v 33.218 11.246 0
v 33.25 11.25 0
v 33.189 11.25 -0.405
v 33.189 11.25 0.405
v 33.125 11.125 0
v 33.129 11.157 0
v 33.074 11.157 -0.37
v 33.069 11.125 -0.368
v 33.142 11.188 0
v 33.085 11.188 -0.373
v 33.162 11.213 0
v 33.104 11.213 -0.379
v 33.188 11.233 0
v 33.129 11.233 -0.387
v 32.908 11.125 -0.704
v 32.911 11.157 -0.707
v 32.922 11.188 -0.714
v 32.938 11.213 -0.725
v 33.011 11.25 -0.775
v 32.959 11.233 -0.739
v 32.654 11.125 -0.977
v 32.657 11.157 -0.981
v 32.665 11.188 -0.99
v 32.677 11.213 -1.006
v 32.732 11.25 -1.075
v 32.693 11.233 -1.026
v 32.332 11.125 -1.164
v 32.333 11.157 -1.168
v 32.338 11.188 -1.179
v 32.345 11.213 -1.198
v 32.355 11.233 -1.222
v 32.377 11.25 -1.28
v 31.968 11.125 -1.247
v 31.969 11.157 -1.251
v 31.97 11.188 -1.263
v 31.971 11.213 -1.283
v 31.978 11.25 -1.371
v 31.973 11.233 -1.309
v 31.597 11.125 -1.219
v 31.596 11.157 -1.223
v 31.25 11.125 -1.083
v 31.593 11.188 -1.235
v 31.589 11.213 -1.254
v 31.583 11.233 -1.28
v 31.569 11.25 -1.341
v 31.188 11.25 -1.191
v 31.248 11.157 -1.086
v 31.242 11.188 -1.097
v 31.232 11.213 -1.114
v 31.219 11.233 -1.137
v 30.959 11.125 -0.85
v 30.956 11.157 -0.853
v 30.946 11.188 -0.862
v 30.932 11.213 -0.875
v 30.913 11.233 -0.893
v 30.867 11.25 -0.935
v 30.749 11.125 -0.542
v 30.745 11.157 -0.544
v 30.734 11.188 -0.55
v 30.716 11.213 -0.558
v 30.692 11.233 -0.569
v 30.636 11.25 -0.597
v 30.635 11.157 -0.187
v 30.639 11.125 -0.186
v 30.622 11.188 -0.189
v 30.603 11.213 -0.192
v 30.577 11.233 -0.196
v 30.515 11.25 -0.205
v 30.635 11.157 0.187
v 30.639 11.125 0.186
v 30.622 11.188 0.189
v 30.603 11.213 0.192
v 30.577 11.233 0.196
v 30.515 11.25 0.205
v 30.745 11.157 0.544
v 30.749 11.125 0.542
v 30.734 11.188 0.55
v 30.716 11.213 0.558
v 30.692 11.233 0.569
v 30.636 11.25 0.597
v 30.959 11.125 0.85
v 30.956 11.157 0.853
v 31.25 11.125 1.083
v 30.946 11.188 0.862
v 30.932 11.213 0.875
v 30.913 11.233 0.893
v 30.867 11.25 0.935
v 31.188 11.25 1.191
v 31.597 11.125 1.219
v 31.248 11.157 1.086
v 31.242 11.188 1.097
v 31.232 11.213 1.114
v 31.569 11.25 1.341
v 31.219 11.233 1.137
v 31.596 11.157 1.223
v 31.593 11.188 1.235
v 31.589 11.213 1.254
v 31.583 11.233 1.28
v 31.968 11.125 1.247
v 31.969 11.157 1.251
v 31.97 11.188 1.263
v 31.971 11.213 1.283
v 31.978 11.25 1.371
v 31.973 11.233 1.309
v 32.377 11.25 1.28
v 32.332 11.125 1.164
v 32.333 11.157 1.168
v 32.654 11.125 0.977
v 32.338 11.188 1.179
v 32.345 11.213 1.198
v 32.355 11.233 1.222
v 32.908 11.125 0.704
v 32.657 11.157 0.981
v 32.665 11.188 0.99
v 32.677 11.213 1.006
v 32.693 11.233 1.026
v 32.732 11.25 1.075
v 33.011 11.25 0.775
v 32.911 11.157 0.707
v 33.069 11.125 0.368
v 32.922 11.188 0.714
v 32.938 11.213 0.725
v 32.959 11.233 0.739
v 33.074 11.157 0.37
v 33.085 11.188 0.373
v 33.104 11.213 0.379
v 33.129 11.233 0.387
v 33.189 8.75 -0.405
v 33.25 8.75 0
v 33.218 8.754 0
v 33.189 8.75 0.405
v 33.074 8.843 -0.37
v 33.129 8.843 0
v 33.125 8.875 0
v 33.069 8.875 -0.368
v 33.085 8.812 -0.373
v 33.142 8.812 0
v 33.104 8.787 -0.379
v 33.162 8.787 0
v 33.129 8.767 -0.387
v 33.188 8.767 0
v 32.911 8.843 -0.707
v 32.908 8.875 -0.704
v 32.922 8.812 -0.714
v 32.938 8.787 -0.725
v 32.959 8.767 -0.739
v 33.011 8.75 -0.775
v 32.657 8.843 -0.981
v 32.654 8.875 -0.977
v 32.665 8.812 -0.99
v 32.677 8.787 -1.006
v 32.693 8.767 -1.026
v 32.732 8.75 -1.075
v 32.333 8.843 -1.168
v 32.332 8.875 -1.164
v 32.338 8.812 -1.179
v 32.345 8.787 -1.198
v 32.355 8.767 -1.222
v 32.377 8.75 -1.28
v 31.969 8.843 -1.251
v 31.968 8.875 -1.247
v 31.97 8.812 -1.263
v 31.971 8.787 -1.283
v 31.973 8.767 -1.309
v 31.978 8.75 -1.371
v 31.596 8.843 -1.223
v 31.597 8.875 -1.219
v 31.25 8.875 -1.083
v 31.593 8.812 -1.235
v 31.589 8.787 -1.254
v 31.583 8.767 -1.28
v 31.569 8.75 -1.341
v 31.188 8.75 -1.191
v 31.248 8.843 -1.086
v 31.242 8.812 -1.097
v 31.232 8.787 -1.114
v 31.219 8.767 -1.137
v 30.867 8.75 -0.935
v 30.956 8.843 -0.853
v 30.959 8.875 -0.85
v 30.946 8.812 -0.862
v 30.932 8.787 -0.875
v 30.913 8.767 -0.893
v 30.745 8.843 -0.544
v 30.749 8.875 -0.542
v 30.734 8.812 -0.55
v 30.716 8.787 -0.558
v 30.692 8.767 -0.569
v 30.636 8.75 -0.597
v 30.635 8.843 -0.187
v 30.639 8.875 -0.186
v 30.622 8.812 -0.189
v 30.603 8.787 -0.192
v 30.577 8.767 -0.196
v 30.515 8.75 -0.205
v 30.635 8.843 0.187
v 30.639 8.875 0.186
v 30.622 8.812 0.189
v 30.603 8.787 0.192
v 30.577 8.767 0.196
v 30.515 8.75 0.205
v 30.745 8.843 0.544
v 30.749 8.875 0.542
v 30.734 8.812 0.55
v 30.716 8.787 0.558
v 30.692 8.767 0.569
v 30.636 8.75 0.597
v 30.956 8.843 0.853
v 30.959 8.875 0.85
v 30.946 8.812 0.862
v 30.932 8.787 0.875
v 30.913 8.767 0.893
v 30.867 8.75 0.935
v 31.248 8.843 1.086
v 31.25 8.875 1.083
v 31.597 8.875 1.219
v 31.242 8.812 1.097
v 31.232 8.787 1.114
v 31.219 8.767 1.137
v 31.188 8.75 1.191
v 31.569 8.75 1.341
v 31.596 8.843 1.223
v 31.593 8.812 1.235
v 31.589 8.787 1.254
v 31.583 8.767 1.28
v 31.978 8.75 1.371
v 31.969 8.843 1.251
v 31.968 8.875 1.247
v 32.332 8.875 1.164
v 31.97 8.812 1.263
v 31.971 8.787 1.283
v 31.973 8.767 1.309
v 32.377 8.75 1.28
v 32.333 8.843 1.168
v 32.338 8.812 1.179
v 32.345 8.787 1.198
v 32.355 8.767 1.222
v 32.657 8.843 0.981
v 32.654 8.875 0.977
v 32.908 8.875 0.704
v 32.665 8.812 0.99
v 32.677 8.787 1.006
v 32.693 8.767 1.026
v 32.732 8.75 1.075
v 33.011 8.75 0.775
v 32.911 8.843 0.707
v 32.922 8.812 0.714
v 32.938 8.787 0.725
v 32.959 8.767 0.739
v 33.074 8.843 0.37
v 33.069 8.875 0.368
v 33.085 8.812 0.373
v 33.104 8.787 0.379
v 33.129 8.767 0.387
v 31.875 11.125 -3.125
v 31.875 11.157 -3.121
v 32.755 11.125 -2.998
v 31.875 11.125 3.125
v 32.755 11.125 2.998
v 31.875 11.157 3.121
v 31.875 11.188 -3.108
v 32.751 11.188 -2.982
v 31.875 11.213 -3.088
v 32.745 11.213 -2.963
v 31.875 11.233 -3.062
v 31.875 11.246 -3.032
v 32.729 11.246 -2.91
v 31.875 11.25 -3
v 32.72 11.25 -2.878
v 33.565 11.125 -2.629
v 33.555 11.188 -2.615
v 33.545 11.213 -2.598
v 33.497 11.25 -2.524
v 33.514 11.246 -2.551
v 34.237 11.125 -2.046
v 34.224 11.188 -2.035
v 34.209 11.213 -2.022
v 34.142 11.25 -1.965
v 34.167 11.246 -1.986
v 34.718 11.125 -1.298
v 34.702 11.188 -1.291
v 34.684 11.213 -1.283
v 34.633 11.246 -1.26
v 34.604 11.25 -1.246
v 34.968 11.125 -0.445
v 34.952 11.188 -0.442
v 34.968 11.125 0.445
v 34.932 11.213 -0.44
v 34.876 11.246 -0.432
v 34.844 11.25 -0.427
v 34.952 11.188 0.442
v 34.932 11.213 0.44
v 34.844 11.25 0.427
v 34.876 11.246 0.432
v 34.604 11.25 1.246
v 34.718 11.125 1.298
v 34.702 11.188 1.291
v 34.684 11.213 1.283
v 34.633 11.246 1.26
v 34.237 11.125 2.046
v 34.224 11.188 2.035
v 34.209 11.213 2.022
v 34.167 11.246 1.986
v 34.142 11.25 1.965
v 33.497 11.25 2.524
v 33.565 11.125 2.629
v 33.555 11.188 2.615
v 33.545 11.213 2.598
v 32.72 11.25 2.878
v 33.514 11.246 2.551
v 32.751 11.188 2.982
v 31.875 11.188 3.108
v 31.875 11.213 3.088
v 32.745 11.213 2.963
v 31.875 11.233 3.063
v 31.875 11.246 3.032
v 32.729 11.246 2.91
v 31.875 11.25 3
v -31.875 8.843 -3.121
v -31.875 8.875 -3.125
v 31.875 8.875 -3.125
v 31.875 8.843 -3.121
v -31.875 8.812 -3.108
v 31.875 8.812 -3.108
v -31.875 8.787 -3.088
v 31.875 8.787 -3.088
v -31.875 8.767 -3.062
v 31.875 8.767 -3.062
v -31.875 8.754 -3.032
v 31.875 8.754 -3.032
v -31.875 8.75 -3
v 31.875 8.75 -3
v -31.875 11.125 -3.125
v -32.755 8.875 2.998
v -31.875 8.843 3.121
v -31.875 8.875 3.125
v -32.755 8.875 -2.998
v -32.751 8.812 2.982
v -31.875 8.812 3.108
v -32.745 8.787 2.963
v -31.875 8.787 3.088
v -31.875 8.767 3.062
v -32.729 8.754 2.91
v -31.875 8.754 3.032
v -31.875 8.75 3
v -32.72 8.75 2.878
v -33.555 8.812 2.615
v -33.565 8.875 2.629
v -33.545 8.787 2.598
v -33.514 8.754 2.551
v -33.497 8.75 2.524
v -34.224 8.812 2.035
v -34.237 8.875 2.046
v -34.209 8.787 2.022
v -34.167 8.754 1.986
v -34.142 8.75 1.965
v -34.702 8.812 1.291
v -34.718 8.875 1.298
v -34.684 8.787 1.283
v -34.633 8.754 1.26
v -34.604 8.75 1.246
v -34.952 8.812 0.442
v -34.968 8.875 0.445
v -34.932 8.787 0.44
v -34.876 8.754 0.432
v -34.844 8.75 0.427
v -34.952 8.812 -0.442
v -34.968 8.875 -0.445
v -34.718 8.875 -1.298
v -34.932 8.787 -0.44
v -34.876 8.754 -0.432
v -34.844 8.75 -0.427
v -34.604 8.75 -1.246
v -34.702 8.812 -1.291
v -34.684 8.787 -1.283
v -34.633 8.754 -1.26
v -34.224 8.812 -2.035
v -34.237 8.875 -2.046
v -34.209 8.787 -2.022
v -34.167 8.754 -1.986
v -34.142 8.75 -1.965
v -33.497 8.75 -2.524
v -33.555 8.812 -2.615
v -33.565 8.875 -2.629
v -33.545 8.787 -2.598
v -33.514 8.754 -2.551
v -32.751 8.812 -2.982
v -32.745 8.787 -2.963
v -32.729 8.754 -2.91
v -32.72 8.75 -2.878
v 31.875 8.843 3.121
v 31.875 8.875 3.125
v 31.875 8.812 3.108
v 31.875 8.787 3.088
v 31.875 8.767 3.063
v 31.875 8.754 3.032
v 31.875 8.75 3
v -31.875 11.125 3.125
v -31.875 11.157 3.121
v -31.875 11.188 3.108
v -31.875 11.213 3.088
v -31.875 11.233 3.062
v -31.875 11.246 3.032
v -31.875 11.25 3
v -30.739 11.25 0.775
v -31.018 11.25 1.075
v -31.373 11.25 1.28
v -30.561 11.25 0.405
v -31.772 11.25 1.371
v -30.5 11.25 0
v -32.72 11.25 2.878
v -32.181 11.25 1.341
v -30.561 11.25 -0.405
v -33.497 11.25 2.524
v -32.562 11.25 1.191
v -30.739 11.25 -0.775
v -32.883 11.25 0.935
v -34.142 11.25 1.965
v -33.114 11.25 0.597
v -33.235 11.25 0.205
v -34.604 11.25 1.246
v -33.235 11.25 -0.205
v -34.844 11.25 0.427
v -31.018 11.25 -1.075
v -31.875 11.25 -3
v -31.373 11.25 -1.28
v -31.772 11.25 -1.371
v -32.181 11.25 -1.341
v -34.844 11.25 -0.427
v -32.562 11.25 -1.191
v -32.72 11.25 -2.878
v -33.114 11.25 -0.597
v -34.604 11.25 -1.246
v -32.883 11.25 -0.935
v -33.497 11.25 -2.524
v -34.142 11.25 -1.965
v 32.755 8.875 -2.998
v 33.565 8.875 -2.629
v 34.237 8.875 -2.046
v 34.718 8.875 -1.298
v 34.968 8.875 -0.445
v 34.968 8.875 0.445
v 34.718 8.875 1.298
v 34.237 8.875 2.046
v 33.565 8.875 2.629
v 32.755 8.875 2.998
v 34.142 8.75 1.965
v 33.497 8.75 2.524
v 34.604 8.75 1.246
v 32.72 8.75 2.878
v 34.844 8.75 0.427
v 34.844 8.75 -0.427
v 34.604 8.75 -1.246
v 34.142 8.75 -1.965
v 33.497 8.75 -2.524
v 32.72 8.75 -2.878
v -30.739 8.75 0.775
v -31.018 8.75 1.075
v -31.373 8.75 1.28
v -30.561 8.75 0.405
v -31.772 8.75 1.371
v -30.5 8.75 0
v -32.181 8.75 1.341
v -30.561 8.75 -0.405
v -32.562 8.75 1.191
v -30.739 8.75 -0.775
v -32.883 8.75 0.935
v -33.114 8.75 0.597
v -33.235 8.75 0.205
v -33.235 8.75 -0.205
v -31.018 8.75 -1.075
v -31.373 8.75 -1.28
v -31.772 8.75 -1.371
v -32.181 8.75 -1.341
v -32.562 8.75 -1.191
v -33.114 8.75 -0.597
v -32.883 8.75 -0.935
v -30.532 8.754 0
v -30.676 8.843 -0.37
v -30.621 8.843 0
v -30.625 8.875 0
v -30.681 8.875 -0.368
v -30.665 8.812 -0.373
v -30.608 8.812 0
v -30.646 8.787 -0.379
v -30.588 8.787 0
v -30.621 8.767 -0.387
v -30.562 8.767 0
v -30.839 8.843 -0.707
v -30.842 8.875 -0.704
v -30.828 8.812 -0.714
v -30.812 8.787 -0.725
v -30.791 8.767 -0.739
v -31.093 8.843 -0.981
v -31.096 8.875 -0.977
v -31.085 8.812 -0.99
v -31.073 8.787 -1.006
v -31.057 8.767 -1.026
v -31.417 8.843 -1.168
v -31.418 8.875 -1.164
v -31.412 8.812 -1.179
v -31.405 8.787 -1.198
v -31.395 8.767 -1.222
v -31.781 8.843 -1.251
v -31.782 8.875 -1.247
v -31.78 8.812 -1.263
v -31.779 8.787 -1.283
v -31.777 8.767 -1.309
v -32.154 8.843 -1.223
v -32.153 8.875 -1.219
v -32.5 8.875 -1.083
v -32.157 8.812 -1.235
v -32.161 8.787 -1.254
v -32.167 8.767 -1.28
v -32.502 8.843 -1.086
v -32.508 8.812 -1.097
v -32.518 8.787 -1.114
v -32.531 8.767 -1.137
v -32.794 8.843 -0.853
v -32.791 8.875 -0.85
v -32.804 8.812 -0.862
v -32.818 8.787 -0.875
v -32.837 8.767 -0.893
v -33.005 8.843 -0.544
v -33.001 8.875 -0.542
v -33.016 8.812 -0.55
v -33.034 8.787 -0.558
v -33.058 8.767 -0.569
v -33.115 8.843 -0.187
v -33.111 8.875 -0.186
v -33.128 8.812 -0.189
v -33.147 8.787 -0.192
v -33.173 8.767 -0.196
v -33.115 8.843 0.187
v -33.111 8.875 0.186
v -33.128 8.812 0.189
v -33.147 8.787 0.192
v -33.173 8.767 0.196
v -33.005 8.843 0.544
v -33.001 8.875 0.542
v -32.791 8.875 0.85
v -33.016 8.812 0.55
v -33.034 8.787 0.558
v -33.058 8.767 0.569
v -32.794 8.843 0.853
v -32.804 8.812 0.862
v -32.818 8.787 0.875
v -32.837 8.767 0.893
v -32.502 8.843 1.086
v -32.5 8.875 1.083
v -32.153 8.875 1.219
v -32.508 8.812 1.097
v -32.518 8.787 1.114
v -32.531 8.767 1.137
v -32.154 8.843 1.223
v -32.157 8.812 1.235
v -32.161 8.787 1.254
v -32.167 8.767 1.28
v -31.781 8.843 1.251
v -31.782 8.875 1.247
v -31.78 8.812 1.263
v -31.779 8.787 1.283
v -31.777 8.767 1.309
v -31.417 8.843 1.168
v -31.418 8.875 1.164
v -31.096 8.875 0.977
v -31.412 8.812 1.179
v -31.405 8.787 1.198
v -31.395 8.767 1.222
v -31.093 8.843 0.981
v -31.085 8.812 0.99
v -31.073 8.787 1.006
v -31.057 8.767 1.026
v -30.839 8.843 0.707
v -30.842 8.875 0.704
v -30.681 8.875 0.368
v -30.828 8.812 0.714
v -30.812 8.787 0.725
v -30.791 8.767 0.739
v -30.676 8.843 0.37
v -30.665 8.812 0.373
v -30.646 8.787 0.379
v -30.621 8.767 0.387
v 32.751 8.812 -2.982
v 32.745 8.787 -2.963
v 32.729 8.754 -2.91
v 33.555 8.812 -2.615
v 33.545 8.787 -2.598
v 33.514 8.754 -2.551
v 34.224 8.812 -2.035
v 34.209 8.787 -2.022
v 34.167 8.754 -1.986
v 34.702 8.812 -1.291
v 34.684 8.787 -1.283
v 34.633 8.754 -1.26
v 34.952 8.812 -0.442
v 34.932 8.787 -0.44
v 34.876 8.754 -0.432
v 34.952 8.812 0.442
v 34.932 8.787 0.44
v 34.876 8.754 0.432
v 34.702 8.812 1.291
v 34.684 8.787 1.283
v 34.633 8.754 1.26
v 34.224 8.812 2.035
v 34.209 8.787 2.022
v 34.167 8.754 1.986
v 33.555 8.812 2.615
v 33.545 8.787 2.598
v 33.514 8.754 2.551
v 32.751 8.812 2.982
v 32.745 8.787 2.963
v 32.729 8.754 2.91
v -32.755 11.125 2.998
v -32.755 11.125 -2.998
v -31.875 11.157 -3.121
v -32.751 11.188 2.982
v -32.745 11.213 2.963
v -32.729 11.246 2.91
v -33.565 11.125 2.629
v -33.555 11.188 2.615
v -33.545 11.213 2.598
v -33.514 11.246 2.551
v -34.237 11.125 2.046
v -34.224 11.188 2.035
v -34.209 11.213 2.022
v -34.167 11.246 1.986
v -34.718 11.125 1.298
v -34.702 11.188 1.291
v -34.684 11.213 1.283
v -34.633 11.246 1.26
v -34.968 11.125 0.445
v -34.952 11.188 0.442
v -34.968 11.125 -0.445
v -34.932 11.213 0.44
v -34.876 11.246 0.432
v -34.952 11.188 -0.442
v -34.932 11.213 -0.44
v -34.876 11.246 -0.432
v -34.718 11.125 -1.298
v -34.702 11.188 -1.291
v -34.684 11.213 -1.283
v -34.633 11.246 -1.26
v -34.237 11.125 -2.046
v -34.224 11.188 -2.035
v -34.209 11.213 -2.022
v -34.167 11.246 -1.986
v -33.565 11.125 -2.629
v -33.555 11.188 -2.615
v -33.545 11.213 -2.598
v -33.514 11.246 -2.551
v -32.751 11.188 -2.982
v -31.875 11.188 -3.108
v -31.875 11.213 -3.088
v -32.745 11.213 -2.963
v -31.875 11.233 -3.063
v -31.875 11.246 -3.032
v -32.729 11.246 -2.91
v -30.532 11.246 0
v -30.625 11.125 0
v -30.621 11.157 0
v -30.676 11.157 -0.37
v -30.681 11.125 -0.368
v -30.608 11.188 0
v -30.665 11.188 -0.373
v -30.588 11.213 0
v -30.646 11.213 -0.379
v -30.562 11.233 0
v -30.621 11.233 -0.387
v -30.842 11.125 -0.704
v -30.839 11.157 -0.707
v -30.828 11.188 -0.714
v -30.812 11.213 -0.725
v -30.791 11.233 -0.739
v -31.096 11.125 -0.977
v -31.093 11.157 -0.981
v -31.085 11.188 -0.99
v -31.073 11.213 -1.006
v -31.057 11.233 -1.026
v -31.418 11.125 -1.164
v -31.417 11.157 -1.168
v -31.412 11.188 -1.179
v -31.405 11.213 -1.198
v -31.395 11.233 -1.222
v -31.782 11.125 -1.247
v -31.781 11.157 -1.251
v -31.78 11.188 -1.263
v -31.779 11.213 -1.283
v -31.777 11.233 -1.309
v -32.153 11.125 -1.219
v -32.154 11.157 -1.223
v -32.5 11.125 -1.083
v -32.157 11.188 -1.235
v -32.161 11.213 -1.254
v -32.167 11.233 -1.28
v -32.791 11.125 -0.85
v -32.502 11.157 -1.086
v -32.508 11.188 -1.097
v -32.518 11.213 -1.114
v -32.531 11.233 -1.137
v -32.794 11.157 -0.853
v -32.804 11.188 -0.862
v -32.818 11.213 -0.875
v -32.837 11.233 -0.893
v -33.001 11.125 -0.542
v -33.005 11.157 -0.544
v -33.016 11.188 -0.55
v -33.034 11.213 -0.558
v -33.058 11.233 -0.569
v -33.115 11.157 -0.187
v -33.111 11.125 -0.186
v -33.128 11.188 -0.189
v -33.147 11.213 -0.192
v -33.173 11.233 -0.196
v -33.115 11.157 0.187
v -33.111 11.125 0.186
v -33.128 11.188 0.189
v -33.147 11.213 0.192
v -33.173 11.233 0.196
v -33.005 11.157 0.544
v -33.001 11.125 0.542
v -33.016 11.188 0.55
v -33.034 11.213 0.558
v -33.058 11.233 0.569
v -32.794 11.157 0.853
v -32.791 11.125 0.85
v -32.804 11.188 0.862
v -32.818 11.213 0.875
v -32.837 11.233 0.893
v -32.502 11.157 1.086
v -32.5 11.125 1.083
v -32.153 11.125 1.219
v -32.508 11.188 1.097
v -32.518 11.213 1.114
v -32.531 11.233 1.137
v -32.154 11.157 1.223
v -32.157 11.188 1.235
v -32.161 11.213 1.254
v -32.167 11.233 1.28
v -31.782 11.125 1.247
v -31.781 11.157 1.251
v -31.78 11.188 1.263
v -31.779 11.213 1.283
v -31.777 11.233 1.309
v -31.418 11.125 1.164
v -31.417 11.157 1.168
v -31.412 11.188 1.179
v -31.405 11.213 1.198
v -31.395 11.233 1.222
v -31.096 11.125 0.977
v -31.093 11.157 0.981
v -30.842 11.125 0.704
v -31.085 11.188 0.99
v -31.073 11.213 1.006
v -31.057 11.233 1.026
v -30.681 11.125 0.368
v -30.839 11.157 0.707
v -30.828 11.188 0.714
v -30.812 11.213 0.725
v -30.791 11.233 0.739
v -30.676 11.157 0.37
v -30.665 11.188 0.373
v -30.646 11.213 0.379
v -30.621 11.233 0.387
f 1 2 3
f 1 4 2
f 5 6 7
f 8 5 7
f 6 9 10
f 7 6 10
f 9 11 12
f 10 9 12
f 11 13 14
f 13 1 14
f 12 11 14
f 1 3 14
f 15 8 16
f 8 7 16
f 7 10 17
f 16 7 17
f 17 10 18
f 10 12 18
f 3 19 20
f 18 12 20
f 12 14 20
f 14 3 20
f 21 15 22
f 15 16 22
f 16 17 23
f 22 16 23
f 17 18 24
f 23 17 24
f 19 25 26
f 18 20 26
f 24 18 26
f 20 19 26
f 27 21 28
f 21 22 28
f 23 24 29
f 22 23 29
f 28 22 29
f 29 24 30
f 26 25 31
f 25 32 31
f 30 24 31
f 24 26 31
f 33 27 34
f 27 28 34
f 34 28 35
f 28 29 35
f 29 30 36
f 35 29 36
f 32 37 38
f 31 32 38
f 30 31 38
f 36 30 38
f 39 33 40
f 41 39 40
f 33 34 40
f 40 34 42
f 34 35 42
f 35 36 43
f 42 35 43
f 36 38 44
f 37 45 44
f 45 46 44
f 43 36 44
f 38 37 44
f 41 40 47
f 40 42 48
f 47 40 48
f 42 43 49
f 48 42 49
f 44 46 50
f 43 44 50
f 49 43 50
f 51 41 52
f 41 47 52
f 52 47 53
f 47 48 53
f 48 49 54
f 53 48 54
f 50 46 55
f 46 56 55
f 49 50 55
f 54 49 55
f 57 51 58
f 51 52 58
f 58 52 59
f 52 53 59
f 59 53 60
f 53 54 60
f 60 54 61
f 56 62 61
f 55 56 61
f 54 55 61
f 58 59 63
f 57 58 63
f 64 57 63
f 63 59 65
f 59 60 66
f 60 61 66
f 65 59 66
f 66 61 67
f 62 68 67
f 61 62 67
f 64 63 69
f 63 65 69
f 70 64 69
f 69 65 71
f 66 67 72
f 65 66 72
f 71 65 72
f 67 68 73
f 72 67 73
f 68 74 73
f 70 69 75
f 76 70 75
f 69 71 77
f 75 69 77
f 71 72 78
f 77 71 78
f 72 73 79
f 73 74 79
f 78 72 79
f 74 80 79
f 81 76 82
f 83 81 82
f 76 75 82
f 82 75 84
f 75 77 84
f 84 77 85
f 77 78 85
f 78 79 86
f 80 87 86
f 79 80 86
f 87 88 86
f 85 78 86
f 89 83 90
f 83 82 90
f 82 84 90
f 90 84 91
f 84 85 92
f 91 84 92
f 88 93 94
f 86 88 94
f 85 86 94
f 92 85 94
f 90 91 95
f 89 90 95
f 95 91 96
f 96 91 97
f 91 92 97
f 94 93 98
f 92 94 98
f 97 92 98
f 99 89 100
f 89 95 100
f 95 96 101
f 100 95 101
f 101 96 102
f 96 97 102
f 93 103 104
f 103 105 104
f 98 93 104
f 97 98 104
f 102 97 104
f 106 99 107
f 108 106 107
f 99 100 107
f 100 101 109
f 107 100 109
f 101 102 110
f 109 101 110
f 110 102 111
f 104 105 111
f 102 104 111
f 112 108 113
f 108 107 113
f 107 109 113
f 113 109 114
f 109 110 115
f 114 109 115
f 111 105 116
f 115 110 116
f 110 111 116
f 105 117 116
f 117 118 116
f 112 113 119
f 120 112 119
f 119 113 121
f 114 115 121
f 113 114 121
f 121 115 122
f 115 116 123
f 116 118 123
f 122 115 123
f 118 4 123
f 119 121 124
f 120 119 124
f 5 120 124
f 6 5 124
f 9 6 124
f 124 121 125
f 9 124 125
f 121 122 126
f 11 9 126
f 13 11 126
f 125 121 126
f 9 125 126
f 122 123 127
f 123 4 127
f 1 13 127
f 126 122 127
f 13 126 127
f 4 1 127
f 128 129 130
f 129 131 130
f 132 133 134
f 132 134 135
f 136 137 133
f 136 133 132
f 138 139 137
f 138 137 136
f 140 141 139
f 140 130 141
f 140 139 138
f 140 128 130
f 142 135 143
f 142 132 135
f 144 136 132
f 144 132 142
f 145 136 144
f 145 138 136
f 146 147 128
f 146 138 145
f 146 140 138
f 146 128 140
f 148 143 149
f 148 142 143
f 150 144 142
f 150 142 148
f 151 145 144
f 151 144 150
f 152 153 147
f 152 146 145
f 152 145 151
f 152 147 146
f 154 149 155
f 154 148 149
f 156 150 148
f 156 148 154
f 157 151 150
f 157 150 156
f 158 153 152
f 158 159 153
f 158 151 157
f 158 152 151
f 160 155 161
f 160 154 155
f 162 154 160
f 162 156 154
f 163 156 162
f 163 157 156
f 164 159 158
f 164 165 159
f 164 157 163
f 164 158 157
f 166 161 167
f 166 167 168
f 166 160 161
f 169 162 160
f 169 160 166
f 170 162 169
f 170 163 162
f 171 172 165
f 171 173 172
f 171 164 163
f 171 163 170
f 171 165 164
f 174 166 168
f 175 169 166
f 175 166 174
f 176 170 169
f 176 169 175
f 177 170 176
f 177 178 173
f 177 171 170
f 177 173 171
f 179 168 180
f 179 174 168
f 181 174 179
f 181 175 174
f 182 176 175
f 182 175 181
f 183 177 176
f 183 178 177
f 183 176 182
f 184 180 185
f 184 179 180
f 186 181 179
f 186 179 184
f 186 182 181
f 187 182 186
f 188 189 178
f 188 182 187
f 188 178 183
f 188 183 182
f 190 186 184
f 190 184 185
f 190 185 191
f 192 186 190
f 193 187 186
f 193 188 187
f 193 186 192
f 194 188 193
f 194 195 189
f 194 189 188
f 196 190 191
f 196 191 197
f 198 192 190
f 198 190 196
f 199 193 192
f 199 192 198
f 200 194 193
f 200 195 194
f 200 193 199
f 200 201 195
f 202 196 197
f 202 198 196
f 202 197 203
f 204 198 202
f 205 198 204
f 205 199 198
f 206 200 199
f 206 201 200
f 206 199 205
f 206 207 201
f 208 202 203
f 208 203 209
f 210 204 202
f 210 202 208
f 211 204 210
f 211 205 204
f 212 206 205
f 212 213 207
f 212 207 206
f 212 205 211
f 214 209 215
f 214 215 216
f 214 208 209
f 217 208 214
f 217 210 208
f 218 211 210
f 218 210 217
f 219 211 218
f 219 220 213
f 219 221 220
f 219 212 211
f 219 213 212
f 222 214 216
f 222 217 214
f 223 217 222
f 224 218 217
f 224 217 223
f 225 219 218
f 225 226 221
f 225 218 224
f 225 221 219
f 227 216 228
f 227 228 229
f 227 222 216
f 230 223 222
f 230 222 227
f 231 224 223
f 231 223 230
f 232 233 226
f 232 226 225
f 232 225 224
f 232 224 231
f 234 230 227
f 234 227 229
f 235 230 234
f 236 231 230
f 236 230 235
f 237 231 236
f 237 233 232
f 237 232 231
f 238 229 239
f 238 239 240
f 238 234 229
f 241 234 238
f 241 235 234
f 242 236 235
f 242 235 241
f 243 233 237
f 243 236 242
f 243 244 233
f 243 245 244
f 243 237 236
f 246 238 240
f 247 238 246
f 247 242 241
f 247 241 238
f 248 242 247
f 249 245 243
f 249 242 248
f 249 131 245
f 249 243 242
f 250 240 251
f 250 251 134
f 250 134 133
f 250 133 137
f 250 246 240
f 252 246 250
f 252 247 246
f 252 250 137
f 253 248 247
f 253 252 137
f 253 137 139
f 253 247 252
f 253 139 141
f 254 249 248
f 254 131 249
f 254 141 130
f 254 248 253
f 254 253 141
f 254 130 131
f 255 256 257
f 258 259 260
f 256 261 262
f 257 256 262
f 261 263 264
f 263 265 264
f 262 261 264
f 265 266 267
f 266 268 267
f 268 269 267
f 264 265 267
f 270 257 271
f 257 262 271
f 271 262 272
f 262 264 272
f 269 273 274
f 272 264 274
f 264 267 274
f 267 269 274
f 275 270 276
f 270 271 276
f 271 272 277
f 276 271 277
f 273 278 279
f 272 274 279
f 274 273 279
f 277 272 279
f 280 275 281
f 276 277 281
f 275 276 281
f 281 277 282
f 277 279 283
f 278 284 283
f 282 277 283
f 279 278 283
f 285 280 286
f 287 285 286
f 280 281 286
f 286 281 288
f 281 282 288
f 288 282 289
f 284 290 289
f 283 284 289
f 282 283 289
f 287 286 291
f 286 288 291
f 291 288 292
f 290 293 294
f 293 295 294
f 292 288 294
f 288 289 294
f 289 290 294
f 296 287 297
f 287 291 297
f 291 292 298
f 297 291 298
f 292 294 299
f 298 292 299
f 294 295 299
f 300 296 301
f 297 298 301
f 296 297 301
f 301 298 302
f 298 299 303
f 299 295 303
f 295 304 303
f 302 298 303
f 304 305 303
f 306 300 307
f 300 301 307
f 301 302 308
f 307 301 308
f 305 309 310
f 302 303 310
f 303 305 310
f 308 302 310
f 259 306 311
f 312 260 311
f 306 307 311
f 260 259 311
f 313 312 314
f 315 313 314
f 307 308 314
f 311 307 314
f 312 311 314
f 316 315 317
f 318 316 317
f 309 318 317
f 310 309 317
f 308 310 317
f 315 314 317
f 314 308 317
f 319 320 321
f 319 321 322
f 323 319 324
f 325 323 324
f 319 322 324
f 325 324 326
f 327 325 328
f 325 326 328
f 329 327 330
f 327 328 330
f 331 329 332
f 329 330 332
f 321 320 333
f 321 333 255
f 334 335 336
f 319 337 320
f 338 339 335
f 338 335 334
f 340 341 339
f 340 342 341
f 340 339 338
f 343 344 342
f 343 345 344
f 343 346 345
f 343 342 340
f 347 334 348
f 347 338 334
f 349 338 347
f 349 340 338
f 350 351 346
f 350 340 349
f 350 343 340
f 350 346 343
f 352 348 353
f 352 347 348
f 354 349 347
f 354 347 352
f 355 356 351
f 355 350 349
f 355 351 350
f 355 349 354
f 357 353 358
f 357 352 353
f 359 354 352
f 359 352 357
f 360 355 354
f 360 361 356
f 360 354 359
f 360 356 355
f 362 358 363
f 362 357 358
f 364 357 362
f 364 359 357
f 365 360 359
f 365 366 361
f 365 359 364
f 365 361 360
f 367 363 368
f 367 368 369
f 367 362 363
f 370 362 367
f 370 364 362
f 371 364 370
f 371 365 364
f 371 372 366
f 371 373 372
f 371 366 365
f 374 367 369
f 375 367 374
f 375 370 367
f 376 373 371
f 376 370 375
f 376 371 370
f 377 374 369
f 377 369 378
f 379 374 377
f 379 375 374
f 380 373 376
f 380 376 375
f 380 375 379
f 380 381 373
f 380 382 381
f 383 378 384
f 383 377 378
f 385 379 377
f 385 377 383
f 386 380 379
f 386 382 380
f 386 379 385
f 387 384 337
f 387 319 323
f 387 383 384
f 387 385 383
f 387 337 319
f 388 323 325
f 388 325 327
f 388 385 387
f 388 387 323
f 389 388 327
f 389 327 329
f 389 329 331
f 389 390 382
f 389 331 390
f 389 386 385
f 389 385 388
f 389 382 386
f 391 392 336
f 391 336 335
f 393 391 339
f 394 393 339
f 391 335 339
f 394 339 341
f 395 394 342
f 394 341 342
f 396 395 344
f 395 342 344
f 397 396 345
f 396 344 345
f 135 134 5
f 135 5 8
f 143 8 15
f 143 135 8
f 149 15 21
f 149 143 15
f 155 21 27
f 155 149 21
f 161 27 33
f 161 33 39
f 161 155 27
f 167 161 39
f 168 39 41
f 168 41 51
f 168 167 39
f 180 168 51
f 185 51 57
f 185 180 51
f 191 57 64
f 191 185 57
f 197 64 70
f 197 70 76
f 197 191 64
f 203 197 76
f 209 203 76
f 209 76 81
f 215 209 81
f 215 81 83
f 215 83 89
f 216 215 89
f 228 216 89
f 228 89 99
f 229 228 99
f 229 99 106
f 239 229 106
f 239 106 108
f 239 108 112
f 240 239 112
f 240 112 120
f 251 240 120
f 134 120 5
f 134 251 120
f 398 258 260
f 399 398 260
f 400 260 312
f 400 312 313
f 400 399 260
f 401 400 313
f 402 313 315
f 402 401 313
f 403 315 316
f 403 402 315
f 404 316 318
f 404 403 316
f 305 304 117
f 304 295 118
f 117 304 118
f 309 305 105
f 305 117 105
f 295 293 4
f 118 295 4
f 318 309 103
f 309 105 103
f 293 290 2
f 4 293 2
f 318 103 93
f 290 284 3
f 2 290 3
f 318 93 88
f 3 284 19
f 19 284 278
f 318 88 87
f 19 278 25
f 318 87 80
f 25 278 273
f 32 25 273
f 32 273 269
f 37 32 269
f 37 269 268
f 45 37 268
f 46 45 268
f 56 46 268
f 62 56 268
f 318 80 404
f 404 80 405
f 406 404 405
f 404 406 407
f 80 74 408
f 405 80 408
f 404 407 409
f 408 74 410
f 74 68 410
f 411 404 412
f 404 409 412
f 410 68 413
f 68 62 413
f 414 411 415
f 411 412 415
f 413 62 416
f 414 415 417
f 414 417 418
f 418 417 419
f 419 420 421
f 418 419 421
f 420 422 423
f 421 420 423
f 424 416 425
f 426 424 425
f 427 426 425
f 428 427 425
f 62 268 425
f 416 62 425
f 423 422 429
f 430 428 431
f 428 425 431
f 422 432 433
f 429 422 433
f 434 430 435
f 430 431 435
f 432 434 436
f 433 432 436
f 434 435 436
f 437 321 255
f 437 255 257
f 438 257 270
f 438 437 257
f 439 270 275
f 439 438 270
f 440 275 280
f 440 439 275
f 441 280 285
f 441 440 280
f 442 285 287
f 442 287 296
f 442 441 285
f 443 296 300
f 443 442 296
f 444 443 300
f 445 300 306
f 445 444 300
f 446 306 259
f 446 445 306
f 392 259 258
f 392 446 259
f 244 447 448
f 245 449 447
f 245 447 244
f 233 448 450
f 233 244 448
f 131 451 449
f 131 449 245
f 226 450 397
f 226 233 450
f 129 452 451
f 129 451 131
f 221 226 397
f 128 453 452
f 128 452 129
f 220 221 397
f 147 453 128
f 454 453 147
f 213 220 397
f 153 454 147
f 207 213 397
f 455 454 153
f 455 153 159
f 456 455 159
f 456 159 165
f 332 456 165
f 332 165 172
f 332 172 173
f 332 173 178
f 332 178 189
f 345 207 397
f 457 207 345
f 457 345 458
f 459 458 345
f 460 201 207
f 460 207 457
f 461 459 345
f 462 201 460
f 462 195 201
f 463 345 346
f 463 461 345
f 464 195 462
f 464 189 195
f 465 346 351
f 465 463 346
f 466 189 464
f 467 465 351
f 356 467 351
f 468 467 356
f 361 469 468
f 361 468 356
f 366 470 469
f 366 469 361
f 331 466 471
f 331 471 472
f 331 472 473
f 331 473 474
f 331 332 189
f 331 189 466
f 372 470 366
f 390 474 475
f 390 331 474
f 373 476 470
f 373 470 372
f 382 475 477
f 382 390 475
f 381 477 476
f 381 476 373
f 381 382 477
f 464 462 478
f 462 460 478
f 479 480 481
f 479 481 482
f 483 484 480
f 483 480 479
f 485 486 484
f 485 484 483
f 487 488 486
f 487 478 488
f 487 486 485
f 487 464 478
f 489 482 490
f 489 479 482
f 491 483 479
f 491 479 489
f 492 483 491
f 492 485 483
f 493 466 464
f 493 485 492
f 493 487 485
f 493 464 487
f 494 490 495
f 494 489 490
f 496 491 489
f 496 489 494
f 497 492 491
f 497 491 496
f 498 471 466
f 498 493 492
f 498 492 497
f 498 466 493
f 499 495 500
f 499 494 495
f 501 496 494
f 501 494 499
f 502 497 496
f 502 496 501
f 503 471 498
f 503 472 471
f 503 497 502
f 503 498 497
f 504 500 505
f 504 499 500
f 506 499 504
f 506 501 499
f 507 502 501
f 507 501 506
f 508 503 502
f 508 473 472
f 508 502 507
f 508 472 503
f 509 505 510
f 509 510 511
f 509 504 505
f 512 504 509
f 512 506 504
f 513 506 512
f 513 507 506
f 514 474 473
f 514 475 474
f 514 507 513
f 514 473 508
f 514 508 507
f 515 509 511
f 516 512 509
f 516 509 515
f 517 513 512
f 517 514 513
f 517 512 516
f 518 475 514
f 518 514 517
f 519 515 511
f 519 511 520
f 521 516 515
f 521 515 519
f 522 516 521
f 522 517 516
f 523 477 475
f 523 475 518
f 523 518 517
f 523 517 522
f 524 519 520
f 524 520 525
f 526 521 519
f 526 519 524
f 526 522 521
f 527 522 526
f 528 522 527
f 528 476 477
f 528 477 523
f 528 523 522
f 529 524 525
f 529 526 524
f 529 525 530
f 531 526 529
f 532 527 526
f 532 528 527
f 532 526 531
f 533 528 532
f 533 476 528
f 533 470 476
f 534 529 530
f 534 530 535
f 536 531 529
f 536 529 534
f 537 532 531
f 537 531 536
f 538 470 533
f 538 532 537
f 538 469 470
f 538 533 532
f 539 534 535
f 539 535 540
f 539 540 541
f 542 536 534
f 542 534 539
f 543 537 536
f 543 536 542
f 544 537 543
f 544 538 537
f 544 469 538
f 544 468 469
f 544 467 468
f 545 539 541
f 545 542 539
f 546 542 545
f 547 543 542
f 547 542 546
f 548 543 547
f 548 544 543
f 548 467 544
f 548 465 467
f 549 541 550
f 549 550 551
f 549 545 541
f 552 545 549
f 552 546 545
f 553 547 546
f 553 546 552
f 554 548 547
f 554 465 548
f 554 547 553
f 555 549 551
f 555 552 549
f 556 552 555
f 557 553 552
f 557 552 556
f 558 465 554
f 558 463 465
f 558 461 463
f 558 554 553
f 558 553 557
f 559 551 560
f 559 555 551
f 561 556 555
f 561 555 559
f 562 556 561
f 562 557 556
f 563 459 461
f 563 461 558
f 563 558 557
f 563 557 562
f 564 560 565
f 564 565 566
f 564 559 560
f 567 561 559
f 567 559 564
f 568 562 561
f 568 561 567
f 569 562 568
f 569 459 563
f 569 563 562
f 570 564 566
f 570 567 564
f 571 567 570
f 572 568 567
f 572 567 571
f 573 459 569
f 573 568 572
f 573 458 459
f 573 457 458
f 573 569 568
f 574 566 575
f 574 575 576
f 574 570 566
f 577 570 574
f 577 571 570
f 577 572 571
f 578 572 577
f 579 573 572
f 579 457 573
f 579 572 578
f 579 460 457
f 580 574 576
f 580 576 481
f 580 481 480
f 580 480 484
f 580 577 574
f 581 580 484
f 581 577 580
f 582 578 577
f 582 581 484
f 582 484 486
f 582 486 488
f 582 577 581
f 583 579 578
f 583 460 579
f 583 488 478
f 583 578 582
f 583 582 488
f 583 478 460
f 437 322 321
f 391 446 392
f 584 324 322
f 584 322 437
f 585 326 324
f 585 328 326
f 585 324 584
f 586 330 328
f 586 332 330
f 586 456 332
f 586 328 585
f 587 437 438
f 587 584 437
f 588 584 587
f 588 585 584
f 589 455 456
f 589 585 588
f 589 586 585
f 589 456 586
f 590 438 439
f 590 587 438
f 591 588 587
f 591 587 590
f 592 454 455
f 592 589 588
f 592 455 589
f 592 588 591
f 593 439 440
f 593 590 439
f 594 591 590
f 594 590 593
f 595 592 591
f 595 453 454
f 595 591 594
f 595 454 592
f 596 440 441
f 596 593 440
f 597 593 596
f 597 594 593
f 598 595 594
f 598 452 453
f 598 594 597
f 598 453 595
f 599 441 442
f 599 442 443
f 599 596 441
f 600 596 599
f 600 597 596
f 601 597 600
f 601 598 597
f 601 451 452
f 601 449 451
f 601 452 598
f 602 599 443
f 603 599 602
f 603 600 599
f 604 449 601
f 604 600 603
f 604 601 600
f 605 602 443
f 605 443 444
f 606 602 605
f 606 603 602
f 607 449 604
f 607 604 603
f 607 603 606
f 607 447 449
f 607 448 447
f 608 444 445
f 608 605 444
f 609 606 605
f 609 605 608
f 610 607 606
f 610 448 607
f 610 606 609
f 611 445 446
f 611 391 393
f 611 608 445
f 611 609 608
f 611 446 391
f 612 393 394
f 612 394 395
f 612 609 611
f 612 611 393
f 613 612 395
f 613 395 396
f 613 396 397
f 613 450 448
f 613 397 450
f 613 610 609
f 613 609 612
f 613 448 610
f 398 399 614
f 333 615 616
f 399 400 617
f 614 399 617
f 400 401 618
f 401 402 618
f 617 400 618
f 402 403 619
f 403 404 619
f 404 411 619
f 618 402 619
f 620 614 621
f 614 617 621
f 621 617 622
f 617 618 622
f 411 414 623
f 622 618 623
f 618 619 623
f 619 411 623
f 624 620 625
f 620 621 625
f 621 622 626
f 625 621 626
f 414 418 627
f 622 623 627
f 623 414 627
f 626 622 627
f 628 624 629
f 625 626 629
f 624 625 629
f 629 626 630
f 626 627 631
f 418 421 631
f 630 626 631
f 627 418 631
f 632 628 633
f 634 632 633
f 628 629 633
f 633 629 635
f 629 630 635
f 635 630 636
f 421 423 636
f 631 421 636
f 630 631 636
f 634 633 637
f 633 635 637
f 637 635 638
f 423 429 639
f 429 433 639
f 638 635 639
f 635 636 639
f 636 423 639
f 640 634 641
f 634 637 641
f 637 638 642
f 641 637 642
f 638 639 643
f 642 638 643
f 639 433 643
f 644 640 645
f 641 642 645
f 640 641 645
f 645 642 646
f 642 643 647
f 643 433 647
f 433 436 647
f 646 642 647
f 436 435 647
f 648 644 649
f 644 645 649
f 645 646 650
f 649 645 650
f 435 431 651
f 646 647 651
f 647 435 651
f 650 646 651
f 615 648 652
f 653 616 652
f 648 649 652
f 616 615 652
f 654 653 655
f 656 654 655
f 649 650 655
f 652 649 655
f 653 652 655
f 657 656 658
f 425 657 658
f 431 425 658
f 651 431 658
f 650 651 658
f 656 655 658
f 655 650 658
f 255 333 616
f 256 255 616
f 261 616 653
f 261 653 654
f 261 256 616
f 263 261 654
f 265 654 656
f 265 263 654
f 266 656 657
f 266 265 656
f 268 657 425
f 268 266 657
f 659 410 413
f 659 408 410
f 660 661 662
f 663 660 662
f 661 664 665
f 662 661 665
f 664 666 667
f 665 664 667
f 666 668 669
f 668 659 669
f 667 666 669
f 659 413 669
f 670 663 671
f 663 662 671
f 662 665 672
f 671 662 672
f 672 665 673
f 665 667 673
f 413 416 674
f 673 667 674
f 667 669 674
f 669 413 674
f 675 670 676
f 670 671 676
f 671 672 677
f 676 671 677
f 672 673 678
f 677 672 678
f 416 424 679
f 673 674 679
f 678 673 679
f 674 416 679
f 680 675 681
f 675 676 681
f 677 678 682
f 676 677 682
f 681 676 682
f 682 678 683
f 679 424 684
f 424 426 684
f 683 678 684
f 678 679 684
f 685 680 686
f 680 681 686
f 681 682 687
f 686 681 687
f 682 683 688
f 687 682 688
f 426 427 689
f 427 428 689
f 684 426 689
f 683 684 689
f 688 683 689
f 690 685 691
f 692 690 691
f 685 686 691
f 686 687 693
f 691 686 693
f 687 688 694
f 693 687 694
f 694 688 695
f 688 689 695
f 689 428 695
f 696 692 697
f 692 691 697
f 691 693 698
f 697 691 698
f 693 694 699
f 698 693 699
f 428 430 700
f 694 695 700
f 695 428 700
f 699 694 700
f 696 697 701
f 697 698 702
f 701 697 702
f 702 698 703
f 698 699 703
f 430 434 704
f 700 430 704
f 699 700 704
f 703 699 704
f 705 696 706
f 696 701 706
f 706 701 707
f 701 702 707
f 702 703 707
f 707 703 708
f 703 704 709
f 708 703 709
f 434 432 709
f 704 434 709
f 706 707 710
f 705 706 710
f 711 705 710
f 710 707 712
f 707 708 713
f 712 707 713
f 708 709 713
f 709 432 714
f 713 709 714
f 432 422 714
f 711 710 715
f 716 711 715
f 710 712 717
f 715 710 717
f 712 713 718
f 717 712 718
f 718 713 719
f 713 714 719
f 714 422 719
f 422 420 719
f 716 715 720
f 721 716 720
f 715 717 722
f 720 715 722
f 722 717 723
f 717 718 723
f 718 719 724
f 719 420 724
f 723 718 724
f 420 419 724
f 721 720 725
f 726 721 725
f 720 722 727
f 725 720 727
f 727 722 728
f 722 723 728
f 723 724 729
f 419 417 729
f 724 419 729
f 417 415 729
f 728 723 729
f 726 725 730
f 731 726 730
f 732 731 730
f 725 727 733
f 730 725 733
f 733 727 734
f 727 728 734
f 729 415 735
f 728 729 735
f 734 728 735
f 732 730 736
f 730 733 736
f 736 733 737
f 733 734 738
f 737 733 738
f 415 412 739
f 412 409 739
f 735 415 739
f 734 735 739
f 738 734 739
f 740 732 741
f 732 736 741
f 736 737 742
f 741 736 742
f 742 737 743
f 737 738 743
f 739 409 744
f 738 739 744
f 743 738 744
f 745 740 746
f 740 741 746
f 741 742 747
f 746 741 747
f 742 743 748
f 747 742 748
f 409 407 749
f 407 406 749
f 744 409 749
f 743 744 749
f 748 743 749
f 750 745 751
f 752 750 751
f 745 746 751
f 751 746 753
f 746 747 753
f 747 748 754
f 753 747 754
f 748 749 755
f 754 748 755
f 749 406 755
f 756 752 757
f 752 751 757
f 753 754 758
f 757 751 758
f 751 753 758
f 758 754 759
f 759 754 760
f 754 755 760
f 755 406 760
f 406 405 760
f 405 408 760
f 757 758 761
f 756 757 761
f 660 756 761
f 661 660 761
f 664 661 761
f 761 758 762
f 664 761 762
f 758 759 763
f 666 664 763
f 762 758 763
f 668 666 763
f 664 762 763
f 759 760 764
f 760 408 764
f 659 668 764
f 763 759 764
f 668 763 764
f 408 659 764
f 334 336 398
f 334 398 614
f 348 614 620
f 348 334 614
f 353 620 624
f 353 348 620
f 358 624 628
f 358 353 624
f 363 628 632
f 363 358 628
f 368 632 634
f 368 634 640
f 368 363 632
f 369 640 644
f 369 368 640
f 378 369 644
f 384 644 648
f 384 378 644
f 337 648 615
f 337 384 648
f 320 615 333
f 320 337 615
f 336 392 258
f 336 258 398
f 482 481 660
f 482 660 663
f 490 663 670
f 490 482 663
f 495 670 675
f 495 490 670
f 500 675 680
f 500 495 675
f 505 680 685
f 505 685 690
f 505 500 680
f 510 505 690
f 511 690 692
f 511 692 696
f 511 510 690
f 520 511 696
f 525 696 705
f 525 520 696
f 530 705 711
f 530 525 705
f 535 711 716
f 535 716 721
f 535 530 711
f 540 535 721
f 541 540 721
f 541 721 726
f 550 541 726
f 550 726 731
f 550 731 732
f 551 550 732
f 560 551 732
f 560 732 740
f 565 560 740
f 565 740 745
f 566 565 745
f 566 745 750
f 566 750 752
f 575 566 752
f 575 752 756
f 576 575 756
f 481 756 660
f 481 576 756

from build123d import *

# Parameters (mm, degrees)
SKETCH1_R           = 10
BOSS_EXTRUDE1_DEPTH = 20
FILLET1_R           = 1
SCALE1_SCALE        = 0.125


with BuildPart() as part:
    # Sketch1 → Boss-Extrude1 (new body)
    with BuildSketch(Plane(origin=(0, 0, 0), x_dir=(1, 0, 0), z_dir=(0, 1, 0))):
        with BuildLine():
            Line((-255, 25), (255, 25))
            ThreePointArc((255, 25), (280, 0), (255, -25))
            Line((255, -25), (-255, -25))
            ThreePointArc((-255, -25), (-280, 0), (-255, 25))
        make_face()
        with Locations((-255, 0)):
            Circle(SKETCH1_R, mode=Mode.SUBTRACT)
        with Locations((255, 0)):
            Circle(SKETCH1_R, mode=Mode.SUBTRACT)
    extrude(amount=BOSS_EXTRUDE1_DEPTH)

    # Fillet1
    fillet1_edges = [part.edges().sort_by_distance(p)[0] for p in [
        (-265, 0, 0),
        (-265, 20, 0),
        (280, 20, 0),
        (245, 0, 0),
        (245, 20, 0),
        (0, 20, -25),
        (-280, 20, 0),
        (0, 0, -25),
        (280, 0, 0),
        (0, 0, 25),
        (-280, 0, 0),
        (0, 20, 25),
    ]]
    fillet(fillet1_edges, radius=FILLET1_R)


with BuildPart() as part_1:
    # Scale1: scaled about (0, 10, 0)
    add(part.part.scale(SCALE1_SCALE).moved(Location((0, 8.75, 0))))


solid = part_1.part
